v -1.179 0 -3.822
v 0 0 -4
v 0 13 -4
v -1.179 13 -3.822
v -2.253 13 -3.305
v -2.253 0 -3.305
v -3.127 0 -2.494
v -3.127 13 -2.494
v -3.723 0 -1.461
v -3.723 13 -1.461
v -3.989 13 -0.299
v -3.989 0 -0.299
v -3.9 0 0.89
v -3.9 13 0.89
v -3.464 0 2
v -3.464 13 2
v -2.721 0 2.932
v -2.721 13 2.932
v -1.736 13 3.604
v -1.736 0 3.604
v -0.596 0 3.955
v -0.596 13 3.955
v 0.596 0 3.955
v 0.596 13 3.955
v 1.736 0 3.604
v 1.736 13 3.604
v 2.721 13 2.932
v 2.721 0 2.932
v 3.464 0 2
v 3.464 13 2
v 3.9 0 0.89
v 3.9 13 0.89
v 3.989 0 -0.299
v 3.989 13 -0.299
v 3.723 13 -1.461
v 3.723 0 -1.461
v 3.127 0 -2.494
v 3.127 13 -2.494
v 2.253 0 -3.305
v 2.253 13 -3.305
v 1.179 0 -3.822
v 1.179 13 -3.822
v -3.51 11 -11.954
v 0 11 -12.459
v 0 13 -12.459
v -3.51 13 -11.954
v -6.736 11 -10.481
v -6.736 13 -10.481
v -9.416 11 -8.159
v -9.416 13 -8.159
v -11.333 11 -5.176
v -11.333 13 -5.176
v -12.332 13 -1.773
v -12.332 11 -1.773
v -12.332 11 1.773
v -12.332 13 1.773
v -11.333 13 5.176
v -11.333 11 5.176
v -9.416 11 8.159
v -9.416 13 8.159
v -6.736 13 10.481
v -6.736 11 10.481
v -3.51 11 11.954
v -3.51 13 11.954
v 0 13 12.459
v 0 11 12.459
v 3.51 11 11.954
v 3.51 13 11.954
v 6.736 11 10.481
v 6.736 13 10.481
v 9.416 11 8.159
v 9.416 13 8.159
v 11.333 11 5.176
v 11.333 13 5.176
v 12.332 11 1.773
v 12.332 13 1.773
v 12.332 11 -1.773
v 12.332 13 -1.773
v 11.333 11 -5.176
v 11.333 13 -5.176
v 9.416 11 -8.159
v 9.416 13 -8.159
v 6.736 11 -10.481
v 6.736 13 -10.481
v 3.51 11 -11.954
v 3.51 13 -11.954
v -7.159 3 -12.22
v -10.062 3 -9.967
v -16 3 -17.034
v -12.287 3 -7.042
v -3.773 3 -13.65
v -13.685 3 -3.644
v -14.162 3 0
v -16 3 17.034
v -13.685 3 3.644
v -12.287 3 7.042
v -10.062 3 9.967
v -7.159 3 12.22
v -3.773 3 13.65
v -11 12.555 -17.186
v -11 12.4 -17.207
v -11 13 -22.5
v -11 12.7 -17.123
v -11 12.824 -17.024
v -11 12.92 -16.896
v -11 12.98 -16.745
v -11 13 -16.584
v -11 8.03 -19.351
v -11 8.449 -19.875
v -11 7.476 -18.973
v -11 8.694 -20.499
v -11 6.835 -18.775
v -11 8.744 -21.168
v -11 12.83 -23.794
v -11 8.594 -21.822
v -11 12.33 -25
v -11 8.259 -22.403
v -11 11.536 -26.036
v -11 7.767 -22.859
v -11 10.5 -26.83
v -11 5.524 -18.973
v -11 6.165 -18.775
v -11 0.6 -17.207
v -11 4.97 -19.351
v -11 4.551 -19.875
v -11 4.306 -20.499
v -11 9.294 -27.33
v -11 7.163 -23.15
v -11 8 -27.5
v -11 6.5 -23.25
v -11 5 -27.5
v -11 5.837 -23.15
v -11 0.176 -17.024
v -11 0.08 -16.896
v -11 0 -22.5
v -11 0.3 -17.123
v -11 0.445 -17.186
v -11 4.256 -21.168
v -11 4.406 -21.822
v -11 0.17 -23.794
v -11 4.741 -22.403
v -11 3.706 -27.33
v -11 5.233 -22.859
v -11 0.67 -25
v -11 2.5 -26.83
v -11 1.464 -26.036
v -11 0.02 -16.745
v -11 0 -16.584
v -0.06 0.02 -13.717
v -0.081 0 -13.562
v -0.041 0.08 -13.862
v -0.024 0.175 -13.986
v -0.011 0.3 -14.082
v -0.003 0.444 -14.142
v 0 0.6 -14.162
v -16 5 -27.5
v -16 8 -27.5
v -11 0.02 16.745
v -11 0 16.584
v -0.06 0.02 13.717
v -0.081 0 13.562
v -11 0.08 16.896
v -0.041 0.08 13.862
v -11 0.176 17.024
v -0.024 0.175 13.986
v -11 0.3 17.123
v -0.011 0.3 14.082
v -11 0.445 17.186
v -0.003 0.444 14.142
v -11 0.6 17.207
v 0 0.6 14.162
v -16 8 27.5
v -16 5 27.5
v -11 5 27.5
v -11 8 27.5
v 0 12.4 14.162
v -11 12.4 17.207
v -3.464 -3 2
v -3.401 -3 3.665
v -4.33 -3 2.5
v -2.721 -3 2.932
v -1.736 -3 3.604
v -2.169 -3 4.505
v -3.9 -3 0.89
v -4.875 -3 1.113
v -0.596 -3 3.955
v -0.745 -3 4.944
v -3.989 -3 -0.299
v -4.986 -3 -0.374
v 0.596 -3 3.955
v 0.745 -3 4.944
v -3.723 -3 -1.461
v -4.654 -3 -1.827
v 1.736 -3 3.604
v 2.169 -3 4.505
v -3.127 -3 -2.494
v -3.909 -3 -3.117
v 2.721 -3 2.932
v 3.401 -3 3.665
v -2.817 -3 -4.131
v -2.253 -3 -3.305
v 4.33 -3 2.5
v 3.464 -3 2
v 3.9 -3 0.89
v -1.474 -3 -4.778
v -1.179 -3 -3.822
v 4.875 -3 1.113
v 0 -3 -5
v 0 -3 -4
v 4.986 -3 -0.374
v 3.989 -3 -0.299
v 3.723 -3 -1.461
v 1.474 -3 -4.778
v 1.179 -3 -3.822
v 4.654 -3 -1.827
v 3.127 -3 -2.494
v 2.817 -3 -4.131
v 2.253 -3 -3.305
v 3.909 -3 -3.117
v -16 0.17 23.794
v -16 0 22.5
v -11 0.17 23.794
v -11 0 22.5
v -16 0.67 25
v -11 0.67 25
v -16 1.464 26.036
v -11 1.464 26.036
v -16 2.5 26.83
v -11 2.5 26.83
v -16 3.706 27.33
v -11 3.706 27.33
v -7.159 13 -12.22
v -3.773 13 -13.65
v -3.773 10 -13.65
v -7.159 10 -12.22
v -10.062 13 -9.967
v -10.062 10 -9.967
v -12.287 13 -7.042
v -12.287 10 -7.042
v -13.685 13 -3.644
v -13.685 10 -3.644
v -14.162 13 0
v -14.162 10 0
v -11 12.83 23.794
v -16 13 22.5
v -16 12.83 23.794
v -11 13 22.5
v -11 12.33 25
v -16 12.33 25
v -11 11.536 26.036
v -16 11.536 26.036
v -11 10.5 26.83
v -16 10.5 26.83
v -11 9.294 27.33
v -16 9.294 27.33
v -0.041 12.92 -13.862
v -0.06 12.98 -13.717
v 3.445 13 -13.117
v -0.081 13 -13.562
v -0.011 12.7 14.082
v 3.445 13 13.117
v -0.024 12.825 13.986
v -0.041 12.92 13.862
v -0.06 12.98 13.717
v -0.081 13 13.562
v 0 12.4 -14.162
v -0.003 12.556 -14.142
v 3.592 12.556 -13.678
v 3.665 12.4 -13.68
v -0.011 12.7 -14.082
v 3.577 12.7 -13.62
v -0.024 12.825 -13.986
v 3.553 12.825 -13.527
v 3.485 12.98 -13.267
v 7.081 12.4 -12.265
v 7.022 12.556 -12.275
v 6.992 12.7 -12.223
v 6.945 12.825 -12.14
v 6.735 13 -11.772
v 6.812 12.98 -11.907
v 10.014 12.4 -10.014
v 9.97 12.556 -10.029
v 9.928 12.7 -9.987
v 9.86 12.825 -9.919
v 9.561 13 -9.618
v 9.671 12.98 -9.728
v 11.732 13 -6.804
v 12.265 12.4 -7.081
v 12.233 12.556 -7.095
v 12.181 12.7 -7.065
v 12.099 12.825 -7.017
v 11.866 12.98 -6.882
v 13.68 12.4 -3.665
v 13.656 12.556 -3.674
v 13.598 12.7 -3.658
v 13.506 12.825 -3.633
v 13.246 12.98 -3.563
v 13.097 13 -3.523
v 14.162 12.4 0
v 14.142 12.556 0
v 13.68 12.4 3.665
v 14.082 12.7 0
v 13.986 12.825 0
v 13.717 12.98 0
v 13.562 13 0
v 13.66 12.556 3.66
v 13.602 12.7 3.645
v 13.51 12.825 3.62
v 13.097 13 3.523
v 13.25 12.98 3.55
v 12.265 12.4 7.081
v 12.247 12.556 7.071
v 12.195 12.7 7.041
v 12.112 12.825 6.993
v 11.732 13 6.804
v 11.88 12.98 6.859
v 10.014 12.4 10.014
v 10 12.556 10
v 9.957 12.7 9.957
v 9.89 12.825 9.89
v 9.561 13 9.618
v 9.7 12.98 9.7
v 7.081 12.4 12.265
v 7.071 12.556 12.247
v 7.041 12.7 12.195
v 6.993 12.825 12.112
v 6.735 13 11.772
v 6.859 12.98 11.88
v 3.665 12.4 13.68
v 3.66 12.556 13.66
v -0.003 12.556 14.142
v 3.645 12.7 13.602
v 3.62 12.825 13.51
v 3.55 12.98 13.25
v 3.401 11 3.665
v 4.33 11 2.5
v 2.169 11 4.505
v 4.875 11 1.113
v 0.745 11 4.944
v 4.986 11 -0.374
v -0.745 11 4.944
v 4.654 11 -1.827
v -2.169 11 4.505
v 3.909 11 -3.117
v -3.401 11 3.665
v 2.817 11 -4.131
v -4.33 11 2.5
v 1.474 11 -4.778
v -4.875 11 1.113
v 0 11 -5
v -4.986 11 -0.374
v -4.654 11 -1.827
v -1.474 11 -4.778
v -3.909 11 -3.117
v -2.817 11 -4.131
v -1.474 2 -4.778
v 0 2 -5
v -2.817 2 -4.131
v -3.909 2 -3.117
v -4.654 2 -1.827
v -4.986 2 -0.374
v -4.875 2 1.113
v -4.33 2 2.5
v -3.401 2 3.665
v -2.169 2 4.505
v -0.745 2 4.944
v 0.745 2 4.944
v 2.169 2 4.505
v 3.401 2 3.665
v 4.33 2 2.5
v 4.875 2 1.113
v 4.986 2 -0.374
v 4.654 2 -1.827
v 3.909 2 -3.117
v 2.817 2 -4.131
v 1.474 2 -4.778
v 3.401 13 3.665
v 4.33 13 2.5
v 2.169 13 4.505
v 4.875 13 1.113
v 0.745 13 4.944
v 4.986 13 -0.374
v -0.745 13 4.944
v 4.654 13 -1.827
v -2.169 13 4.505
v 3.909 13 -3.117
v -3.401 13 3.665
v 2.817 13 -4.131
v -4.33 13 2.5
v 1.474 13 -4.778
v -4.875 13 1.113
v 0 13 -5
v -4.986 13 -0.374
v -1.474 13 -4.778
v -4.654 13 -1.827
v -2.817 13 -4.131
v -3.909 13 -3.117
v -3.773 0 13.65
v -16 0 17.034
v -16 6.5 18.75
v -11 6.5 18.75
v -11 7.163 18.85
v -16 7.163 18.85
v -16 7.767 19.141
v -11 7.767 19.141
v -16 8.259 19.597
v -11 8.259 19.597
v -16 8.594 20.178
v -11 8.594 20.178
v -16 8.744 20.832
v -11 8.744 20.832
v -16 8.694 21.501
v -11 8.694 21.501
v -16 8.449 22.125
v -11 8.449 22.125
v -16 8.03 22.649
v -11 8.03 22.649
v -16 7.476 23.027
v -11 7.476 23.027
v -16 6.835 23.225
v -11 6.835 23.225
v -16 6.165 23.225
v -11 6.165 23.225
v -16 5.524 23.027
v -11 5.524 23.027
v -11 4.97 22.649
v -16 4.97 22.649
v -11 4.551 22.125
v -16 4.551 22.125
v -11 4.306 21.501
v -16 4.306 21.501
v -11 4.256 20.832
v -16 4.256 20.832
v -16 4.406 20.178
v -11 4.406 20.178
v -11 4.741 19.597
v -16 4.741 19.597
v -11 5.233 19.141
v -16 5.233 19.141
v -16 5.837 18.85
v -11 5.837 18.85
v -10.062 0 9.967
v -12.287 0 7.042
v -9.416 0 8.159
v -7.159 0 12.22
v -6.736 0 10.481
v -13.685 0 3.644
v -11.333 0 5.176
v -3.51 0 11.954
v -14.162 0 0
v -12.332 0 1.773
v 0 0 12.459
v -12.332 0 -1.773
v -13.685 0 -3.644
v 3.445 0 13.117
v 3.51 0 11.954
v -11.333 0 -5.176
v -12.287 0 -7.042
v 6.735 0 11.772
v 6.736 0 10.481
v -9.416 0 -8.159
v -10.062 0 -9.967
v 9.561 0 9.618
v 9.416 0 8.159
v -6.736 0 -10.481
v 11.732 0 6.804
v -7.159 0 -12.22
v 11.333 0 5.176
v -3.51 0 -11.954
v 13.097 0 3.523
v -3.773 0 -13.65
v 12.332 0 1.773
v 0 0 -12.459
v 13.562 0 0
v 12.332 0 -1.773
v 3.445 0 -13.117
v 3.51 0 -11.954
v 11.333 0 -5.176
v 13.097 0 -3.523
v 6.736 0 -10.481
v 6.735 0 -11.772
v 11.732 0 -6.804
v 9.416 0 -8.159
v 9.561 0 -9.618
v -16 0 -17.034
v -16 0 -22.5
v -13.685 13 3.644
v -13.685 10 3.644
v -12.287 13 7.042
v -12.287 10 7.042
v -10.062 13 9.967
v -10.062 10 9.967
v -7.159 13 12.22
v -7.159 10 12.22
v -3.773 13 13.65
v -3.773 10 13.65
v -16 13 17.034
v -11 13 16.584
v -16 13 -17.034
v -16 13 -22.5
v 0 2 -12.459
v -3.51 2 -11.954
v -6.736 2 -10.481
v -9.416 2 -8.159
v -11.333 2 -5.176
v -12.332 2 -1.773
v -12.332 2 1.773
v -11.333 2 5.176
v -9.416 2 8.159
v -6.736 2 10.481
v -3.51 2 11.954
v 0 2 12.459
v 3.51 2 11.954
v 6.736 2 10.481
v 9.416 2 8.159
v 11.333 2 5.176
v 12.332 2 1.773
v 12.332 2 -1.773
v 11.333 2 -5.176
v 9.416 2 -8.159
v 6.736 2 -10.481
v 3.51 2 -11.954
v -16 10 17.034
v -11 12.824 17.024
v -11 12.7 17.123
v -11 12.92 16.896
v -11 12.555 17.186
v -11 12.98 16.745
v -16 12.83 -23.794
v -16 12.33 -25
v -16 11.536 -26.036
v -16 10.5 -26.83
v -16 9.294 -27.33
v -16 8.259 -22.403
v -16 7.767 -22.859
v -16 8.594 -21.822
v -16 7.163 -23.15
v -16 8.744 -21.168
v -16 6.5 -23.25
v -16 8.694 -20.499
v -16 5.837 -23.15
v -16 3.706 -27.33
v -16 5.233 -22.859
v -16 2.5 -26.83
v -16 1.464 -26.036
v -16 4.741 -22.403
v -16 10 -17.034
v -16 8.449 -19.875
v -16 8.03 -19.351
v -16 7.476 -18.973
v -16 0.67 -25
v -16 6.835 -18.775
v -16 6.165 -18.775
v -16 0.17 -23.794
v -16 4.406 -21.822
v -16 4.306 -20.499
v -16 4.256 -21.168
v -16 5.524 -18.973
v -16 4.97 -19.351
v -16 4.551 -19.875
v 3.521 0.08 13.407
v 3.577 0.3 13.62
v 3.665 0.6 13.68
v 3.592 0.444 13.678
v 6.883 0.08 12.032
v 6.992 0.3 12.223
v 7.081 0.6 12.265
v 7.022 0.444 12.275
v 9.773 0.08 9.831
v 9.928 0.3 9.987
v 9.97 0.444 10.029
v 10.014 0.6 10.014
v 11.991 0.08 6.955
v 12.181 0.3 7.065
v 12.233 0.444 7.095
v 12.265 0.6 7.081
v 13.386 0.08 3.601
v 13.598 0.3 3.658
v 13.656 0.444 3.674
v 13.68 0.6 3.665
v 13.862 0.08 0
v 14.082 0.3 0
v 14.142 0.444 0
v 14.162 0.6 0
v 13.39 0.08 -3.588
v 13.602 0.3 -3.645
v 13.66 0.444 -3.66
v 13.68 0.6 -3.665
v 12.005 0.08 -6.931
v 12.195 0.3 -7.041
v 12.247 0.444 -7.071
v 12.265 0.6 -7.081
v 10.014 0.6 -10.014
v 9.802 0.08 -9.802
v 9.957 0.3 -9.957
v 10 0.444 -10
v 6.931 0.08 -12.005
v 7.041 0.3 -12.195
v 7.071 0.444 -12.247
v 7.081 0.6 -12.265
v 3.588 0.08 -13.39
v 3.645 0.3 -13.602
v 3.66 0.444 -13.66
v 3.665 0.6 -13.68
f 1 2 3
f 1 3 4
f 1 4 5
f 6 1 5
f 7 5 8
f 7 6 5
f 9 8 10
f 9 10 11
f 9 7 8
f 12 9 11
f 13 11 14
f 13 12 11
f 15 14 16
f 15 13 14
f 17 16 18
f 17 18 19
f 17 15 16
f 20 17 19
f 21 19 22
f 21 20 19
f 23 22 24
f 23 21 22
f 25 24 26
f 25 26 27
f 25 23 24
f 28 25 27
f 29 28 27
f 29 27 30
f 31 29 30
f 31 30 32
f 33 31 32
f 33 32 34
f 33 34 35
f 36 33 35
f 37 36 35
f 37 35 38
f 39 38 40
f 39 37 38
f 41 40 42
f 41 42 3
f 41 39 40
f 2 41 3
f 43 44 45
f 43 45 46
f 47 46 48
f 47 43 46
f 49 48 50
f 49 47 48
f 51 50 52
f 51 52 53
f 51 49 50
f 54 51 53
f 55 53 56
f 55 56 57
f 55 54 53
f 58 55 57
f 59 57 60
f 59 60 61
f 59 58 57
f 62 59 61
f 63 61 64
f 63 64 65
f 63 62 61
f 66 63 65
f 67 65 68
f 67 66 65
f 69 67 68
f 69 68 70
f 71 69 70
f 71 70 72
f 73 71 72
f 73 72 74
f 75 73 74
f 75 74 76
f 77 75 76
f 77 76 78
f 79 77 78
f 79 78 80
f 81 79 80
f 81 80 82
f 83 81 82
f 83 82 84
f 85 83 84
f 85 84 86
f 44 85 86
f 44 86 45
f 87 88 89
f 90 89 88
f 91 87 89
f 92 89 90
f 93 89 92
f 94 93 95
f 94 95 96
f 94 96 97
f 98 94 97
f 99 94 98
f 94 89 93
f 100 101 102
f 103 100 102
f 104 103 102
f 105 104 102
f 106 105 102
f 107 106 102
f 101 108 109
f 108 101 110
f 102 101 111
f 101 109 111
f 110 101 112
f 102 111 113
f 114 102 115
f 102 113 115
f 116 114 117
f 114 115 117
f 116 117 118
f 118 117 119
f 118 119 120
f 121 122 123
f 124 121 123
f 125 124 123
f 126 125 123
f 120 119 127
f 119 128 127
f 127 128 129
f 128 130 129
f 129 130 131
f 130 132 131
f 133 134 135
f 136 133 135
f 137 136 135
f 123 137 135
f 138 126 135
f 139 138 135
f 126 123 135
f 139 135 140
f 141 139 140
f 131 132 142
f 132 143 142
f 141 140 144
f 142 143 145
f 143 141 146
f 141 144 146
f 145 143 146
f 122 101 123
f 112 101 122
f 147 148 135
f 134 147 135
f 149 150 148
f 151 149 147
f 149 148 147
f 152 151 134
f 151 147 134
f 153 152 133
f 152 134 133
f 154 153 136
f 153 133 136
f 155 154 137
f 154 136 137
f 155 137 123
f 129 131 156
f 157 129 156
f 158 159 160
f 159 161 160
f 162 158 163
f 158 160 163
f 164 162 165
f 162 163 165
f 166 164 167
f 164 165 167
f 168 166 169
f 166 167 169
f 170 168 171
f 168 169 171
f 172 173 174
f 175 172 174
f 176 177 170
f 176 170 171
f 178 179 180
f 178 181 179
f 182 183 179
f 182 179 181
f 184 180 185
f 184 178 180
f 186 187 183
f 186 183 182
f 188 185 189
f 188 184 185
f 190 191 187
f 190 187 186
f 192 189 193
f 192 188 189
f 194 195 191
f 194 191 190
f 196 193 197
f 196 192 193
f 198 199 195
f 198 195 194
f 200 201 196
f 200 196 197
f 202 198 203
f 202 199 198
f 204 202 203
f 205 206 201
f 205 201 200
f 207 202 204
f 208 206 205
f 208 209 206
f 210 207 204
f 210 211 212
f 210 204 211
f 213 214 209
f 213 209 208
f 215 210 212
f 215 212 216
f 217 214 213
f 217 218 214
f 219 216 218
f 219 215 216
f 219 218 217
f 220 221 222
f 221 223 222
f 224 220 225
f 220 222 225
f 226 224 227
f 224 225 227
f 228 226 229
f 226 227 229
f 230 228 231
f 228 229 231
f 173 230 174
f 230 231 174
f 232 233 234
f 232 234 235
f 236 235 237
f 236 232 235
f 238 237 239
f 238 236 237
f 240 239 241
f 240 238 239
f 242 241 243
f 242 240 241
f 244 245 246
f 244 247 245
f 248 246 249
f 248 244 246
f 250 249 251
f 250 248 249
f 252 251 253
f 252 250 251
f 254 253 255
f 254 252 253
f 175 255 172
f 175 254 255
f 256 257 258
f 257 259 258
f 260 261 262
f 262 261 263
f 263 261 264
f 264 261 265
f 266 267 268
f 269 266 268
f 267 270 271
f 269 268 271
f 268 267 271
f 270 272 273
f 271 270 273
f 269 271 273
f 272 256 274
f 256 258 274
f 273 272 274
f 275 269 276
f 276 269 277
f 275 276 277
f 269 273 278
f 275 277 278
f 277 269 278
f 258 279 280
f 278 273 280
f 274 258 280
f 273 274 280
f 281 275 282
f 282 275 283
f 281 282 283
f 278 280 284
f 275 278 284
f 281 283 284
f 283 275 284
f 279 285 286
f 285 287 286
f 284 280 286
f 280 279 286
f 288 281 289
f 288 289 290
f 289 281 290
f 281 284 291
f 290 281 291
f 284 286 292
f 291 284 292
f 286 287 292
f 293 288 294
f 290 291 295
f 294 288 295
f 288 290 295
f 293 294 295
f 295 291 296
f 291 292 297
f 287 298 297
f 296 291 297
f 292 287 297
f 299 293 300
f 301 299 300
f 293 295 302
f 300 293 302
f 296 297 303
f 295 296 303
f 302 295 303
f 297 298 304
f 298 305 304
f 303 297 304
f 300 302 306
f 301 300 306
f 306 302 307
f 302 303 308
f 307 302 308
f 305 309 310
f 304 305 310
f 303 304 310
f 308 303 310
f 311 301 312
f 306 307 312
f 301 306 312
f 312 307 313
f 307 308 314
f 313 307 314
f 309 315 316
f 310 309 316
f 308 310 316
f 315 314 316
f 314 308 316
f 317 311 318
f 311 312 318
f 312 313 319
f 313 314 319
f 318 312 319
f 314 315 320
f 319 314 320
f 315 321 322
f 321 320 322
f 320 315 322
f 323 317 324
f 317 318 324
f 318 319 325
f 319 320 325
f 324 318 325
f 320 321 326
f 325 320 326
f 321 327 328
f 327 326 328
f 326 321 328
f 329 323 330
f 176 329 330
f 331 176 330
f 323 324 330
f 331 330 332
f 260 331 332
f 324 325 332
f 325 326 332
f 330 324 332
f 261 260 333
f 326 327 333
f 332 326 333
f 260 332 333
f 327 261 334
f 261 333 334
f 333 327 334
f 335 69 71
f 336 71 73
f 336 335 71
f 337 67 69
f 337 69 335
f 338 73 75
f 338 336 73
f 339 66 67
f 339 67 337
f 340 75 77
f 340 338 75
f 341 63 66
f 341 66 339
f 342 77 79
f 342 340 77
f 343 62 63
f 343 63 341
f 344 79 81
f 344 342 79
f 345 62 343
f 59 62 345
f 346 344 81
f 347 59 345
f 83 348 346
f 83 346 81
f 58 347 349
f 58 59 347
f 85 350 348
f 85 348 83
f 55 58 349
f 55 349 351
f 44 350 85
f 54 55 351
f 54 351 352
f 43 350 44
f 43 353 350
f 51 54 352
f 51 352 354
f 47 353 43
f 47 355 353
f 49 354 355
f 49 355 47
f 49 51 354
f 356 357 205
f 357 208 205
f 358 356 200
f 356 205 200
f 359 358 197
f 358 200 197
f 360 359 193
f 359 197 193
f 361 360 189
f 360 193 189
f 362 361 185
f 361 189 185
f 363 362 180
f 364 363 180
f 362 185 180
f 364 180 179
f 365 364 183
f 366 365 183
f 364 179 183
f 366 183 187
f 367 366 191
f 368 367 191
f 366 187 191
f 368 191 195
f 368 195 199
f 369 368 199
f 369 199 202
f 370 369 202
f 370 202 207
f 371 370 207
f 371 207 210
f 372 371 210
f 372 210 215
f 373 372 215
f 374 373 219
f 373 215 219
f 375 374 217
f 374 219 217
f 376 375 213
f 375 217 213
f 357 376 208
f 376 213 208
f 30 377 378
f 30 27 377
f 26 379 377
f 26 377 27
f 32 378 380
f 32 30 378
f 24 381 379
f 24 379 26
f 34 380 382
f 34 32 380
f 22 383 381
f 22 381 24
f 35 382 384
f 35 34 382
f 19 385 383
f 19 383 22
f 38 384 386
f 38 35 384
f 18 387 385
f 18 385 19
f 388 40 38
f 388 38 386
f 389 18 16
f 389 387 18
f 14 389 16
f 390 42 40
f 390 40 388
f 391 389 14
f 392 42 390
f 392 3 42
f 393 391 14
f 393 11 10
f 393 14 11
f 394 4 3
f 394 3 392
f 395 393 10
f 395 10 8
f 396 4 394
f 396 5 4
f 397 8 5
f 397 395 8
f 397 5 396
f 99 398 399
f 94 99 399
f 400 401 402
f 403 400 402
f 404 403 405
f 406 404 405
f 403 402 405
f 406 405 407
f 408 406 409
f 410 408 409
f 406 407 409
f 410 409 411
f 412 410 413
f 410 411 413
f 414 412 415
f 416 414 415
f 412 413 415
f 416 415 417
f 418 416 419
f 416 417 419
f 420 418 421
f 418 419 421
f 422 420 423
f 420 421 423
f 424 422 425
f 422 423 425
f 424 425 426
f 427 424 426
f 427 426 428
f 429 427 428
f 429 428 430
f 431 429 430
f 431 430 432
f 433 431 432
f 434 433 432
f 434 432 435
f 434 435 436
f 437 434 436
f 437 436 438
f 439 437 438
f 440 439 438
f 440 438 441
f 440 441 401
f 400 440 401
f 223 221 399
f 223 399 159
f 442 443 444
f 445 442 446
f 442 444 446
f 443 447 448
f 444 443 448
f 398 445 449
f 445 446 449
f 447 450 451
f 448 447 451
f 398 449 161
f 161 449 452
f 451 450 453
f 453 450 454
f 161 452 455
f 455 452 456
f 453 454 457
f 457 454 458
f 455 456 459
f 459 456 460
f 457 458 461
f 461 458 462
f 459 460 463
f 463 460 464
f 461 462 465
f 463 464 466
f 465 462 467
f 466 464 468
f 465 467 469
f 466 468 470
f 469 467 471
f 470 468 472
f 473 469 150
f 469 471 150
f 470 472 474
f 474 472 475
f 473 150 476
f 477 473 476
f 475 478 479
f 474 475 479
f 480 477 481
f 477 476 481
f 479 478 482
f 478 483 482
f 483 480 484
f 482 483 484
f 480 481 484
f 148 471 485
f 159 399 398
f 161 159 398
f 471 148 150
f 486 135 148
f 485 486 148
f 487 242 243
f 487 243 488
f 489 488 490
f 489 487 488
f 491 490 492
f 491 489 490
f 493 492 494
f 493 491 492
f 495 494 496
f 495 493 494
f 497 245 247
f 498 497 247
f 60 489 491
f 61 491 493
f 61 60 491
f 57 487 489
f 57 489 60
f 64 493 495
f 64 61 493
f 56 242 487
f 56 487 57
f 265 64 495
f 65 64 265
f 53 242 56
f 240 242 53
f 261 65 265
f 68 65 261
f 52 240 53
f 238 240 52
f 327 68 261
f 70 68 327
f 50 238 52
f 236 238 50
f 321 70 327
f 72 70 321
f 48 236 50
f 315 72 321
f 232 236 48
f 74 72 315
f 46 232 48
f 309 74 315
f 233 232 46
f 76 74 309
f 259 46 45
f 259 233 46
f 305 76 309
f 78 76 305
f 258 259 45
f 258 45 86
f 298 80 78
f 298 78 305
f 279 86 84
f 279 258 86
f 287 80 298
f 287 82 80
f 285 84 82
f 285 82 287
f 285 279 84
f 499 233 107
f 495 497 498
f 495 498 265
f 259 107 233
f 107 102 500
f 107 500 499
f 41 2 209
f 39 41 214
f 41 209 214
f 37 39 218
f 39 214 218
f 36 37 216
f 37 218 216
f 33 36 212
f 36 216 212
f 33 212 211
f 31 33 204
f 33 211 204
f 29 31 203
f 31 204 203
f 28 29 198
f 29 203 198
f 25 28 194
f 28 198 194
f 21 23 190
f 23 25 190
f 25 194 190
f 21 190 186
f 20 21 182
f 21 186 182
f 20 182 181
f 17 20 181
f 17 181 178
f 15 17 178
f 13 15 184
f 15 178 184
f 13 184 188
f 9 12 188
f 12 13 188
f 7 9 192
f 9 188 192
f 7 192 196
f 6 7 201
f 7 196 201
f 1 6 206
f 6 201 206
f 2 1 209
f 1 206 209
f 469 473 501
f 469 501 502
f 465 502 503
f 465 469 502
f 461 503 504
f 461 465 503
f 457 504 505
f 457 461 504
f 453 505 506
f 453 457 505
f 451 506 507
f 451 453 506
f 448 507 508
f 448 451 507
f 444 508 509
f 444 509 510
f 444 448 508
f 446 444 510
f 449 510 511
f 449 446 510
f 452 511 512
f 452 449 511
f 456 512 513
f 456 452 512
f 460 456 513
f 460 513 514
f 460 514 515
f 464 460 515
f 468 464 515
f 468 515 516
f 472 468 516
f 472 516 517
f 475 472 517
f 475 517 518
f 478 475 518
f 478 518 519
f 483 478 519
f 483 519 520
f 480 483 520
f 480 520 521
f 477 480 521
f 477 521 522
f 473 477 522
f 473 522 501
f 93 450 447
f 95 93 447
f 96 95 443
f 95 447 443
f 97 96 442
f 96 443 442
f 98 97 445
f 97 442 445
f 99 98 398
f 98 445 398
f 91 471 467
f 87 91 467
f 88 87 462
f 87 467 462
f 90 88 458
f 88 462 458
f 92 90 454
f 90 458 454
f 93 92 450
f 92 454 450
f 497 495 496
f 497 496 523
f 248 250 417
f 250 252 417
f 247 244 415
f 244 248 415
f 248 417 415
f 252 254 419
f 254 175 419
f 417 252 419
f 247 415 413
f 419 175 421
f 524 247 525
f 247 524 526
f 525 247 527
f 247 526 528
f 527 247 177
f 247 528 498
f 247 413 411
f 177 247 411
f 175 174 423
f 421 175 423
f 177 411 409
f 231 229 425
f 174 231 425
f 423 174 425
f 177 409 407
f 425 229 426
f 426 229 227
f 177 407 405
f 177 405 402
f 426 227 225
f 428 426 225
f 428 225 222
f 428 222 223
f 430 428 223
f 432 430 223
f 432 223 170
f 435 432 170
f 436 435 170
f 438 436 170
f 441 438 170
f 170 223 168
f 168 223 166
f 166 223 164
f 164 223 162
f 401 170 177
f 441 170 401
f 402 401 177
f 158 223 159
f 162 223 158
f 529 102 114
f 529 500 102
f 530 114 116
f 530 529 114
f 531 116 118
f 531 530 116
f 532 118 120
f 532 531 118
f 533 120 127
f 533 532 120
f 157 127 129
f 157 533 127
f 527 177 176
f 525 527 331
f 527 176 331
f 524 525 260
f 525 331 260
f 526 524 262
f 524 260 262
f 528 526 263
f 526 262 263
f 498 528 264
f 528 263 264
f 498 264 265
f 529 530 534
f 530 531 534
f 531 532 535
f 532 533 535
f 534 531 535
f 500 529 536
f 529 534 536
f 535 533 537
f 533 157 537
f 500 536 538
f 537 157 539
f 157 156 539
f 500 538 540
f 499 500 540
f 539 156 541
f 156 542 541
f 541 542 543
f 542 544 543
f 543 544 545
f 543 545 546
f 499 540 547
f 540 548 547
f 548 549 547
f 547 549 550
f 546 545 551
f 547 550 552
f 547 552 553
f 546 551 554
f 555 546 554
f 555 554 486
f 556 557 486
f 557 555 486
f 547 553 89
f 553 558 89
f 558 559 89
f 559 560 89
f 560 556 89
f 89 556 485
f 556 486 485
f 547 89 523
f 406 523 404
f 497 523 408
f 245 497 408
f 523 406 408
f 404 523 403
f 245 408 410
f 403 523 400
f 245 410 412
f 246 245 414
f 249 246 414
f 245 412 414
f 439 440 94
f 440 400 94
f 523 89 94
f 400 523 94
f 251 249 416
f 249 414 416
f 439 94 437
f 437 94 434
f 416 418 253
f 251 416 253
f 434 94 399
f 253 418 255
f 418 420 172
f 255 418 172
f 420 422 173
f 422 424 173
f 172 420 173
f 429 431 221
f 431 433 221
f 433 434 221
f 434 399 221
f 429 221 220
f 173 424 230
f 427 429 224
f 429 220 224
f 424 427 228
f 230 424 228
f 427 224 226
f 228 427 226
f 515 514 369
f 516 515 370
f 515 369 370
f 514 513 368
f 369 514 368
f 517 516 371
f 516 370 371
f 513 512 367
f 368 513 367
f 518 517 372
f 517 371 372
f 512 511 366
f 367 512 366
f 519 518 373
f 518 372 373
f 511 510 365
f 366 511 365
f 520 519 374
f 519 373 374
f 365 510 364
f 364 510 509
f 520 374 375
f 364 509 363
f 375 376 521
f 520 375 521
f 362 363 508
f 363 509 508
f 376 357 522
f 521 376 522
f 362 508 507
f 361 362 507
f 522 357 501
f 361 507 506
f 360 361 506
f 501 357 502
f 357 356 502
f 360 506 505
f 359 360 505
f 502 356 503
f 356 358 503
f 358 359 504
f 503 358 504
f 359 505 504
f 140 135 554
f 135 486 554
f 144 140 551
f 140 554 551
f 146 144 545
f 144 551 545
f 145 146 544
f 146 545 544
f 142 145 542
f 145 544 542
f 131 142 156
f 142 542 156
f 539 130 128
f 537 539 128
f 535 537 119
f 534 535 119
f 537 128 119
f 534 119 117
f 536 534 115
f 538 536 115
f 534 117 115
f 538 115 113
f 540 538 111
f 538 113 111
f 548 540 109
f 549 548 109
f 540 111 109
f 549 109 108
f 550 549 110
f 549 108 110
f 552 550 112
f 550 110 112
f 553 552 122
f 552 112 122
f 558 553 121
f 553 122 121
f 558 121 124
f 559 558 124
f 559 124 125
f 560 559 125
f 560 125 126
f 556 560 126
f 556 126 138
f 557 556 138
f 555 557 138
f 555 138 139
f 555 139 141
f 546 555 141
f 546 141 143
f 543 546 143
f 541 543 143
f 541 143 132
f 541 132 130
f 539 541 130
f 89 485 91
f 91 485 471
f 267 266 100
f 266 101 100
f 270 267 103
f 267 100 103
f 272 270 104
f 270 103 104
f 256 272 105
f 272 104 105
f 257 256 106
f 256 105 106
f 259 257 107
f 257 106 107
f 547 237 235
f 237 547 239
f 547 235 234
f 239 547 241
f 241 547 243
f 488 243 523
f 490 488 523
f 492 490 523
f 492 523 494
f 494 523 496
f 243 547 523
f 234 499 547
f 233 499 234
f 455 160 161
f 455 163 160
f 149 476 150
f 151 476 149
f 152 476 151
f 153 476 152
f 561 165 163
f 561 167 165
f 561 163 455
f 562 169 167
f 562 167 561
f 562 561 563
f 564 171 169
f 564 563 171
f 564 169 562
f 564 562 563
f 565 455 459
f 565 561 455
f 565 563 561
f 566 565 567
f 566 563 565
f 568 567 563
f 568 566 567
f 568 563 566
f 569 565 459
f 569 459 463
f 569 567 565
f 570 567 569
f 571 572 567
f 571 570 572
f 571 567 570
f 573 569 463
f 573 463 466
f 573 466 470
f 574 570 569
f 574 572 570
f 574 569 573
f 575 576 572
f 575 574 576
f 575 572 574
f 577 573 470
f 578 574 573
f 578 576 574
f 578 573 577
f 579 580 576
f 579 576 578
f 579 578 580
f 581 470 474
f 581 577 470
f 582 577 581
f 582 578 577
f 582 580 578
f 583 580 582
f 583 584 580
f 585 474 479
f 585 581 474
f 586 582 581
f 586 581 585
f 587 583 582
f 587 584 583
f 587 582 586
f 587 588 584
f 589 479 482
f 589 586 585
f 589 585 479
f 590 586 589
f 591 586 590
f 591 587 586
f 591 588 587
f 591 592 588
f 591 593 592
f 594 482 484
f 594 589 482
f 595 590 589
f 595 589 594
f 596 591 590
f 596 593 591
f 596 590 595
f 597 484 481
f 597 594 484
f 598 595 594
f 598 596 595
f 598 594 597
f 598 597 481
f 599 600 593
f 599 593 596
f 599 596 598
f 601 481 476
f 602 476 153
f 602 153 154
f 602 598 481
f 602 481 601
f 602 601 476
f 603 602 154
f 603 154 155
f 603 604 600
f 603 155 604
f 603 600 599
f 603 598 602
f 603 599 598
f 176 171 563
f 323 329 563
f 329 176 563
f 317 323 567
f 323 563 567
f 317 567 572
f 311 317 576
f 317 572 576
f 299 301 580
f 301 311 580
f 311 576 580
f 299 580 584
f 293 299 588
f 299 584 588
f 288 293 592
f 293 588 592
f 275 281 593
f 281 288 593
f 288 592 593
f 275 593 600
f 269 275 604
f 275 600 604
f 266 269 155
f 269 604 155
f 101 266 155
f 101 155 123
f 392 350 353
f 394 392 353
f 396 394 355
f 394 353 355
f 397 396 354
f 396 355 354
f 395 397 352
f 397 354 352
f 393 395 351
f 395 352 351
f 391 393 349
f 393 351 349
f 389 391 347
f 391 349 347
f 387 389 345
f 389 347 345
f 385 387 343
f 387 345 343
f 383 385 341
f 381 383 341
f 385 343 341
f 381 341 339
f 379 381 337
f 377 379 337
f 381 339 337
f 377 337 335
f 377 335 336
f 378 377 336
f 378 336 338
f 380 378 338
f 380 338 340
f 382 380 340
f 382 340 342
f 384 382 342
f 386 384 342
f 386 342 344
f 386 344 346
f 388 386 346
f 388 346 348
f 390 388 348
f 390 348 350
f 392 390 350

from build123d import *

# Parameters (mm, degrees)
SKETCH_1_R          = 12.458976409
EXTRUDE_1_DEPTH     = 13
SKETCH_1_R_2        = 5
SKETCH_1_R_3        = 4
EXTRUDE_1_2_DEPTH   = 13
EXTRUDE_START       = 2
SKETCH_1_3_R        = 12.458976409
SKETCH_1_3_R_2      = 5
EXTRUDE_2_DEPTH     = 9
SKETCH_2_R          = 2.25
CUT_EXTRUDE_1_DEPTH = 9
FILLET_1_R          = 5
EXTRUDE_START_2     = 3
SKETCH_3_R          = 5
SKETCH_3_R_2        = 4
EXTRUDE_3_DEPTH     = 3
CUT_EXTRUDE_2_DEPTH = 3
FILLET_2_R          = 0.6


with BuildPart() as part:
    # Эскиз1 → Бобышка-Вытянуть1 (new body)
    with BuildSketch(Plane(origin=(0, 0, 0), x_dir=(1, 0, 0), z_dir=(0, 1, 0))):
        with BuildLine():
            Line((-11, 27.5), (-16, 27.5))
            Line((-16, 27.5), (-16, -27.5))
            Line((-16, -27.5), (-11, -27.5))
            Line((-11, -27.5), (-11, -17.206839795))
            Line((-11, -17.206839795), (0, -14.162262157))
            ThreePointArc((0, -14.162262157), (14.162262157, 0), (0, 14.162262157))
            Line((0, 14.162262157), (-11, 17.206839795))
            Line((-11, 17.206839795), (-11, 27.5))
        make_face()
        Circle(SKETCH_1_R, mode=Mode.SUBTRACT)
    extrude(amount=EXTRUDE_1_DEPTH)



with BuildPart() as body_2:
    # Эскиз1 → Extrude 1 2 (new body)
    with BuildSketch(Plane(origin=(0, 0, 0), x_dir=(1, 0, 0), z_dir=(0, 1, 0))):
        Circle(SKETCH_1_R_2)
        Circle(SKETCH_1_R_3, mode=Mode.SUBTRACT)
    extrude(amount=EXTRUDE_1_2_DEPTH)


with BuildPart() as part_1:
    add(part.part)

    add(body_2.part)  # Бобышка-Вытянуть2 merges body 2
    # Эскиз1<3> → Бобышка-Вытянуть2 (add)
    with BuildSketch(Plane(origin=(0, 0, 0), x_dir=(1, 0, 0), z_dir=(0, 1, 0)).offset(EXTRUDE_START)):
        Circle(SKETCH_1_3_R)
        Circle(SKETCH_1_3_R_2, mode=Mode.SUBTRACT)
    extrude(amount=EXTRUDE_2_DEPTH)

    # Эскиз2 → Вырез-Вытянуть1 (cut)
    with BuildSketch(Plane(origin=(-11, 0, 0), x_dir=(0, 0, -1), z_dir=(1, 0, 0))):
        with Locations((21, 6.5)):
            Circle(SKETCH_2_R)
        with Locations((-21, 6.5)):
            Circle(SKETCH_2_R)
    extrude(amount=-CUT_EXTRUDE_1_DEPTH, mode=Mode.SUBTRACT)

    # Скругление1
    fillet_1_edges = [part_1.edges().sort_by_distance(p)[0] for p in [
        (-13.5, 0, 27.5),
        (-13.5, 13, 27.5),
        (-13.5, 13, -27.5),
        (-13.5, 0, -27.5),
    ]]
    fillet(fillet_1_edges, radius=FILLET_1_R)

    # Эскиз3 → Бобышка-Вытянуть3 (add)
    with BuildSketch(Plane.XZ.offset(EXTRUDE_START_2)):
        Circle(SKETCH_3_R)
        Circle(SKETCH_3_R_2, mode=Mode.SUBTRACT)
    extrude(amount=-EXTRUDE_3_DEPTH)

    # Эскиз4 → Вырез-Вытянуть2 (cut)
    with BuildSketch(Plane.XZ):
        with BuildLine():
            Line((-16, -17.034343572), (-3.773486703, -13.650291847))
            ThreePointArc((-3.773486703, -13.650291847), (-14.162262157, 0), (-3.773486703, 13.650291847))
            Line((-3.773486703, 13.650291847), (-16, 17.034343572))
            Line((-16, 17.034343572), (-16, -17.034343572))
        make_face()
    cut_extrude_2 = extrude(amount=-CUT_EXTRUDE_2_DEPTH, mode=Mode.SUBTRACT)

    # Зеркальное отражение1: Вырез-Вытянуть2 across plane
    add(cut_extrude_2.mirror(Plane.ZX.offset(6.5)), mode=Mode.SUBTRACT)

    # Скругление2
    fillet_2_edges = [part_1.edges().sort_by_distance(p)[0] for p in [
        (-5.5, 13, 15.684550976),
        (-5.5, 13, -15.684550976),
        (14.162262157, 13, 0),
        (-5.5, 0, 15.684550976),
        (-5.5, 0, -15.684550976),
        (14.162262157, 0, 0),
    ]]
    fillet(fillet_2_edges, radius=FILLET_2_R)


solid = part_1.part
